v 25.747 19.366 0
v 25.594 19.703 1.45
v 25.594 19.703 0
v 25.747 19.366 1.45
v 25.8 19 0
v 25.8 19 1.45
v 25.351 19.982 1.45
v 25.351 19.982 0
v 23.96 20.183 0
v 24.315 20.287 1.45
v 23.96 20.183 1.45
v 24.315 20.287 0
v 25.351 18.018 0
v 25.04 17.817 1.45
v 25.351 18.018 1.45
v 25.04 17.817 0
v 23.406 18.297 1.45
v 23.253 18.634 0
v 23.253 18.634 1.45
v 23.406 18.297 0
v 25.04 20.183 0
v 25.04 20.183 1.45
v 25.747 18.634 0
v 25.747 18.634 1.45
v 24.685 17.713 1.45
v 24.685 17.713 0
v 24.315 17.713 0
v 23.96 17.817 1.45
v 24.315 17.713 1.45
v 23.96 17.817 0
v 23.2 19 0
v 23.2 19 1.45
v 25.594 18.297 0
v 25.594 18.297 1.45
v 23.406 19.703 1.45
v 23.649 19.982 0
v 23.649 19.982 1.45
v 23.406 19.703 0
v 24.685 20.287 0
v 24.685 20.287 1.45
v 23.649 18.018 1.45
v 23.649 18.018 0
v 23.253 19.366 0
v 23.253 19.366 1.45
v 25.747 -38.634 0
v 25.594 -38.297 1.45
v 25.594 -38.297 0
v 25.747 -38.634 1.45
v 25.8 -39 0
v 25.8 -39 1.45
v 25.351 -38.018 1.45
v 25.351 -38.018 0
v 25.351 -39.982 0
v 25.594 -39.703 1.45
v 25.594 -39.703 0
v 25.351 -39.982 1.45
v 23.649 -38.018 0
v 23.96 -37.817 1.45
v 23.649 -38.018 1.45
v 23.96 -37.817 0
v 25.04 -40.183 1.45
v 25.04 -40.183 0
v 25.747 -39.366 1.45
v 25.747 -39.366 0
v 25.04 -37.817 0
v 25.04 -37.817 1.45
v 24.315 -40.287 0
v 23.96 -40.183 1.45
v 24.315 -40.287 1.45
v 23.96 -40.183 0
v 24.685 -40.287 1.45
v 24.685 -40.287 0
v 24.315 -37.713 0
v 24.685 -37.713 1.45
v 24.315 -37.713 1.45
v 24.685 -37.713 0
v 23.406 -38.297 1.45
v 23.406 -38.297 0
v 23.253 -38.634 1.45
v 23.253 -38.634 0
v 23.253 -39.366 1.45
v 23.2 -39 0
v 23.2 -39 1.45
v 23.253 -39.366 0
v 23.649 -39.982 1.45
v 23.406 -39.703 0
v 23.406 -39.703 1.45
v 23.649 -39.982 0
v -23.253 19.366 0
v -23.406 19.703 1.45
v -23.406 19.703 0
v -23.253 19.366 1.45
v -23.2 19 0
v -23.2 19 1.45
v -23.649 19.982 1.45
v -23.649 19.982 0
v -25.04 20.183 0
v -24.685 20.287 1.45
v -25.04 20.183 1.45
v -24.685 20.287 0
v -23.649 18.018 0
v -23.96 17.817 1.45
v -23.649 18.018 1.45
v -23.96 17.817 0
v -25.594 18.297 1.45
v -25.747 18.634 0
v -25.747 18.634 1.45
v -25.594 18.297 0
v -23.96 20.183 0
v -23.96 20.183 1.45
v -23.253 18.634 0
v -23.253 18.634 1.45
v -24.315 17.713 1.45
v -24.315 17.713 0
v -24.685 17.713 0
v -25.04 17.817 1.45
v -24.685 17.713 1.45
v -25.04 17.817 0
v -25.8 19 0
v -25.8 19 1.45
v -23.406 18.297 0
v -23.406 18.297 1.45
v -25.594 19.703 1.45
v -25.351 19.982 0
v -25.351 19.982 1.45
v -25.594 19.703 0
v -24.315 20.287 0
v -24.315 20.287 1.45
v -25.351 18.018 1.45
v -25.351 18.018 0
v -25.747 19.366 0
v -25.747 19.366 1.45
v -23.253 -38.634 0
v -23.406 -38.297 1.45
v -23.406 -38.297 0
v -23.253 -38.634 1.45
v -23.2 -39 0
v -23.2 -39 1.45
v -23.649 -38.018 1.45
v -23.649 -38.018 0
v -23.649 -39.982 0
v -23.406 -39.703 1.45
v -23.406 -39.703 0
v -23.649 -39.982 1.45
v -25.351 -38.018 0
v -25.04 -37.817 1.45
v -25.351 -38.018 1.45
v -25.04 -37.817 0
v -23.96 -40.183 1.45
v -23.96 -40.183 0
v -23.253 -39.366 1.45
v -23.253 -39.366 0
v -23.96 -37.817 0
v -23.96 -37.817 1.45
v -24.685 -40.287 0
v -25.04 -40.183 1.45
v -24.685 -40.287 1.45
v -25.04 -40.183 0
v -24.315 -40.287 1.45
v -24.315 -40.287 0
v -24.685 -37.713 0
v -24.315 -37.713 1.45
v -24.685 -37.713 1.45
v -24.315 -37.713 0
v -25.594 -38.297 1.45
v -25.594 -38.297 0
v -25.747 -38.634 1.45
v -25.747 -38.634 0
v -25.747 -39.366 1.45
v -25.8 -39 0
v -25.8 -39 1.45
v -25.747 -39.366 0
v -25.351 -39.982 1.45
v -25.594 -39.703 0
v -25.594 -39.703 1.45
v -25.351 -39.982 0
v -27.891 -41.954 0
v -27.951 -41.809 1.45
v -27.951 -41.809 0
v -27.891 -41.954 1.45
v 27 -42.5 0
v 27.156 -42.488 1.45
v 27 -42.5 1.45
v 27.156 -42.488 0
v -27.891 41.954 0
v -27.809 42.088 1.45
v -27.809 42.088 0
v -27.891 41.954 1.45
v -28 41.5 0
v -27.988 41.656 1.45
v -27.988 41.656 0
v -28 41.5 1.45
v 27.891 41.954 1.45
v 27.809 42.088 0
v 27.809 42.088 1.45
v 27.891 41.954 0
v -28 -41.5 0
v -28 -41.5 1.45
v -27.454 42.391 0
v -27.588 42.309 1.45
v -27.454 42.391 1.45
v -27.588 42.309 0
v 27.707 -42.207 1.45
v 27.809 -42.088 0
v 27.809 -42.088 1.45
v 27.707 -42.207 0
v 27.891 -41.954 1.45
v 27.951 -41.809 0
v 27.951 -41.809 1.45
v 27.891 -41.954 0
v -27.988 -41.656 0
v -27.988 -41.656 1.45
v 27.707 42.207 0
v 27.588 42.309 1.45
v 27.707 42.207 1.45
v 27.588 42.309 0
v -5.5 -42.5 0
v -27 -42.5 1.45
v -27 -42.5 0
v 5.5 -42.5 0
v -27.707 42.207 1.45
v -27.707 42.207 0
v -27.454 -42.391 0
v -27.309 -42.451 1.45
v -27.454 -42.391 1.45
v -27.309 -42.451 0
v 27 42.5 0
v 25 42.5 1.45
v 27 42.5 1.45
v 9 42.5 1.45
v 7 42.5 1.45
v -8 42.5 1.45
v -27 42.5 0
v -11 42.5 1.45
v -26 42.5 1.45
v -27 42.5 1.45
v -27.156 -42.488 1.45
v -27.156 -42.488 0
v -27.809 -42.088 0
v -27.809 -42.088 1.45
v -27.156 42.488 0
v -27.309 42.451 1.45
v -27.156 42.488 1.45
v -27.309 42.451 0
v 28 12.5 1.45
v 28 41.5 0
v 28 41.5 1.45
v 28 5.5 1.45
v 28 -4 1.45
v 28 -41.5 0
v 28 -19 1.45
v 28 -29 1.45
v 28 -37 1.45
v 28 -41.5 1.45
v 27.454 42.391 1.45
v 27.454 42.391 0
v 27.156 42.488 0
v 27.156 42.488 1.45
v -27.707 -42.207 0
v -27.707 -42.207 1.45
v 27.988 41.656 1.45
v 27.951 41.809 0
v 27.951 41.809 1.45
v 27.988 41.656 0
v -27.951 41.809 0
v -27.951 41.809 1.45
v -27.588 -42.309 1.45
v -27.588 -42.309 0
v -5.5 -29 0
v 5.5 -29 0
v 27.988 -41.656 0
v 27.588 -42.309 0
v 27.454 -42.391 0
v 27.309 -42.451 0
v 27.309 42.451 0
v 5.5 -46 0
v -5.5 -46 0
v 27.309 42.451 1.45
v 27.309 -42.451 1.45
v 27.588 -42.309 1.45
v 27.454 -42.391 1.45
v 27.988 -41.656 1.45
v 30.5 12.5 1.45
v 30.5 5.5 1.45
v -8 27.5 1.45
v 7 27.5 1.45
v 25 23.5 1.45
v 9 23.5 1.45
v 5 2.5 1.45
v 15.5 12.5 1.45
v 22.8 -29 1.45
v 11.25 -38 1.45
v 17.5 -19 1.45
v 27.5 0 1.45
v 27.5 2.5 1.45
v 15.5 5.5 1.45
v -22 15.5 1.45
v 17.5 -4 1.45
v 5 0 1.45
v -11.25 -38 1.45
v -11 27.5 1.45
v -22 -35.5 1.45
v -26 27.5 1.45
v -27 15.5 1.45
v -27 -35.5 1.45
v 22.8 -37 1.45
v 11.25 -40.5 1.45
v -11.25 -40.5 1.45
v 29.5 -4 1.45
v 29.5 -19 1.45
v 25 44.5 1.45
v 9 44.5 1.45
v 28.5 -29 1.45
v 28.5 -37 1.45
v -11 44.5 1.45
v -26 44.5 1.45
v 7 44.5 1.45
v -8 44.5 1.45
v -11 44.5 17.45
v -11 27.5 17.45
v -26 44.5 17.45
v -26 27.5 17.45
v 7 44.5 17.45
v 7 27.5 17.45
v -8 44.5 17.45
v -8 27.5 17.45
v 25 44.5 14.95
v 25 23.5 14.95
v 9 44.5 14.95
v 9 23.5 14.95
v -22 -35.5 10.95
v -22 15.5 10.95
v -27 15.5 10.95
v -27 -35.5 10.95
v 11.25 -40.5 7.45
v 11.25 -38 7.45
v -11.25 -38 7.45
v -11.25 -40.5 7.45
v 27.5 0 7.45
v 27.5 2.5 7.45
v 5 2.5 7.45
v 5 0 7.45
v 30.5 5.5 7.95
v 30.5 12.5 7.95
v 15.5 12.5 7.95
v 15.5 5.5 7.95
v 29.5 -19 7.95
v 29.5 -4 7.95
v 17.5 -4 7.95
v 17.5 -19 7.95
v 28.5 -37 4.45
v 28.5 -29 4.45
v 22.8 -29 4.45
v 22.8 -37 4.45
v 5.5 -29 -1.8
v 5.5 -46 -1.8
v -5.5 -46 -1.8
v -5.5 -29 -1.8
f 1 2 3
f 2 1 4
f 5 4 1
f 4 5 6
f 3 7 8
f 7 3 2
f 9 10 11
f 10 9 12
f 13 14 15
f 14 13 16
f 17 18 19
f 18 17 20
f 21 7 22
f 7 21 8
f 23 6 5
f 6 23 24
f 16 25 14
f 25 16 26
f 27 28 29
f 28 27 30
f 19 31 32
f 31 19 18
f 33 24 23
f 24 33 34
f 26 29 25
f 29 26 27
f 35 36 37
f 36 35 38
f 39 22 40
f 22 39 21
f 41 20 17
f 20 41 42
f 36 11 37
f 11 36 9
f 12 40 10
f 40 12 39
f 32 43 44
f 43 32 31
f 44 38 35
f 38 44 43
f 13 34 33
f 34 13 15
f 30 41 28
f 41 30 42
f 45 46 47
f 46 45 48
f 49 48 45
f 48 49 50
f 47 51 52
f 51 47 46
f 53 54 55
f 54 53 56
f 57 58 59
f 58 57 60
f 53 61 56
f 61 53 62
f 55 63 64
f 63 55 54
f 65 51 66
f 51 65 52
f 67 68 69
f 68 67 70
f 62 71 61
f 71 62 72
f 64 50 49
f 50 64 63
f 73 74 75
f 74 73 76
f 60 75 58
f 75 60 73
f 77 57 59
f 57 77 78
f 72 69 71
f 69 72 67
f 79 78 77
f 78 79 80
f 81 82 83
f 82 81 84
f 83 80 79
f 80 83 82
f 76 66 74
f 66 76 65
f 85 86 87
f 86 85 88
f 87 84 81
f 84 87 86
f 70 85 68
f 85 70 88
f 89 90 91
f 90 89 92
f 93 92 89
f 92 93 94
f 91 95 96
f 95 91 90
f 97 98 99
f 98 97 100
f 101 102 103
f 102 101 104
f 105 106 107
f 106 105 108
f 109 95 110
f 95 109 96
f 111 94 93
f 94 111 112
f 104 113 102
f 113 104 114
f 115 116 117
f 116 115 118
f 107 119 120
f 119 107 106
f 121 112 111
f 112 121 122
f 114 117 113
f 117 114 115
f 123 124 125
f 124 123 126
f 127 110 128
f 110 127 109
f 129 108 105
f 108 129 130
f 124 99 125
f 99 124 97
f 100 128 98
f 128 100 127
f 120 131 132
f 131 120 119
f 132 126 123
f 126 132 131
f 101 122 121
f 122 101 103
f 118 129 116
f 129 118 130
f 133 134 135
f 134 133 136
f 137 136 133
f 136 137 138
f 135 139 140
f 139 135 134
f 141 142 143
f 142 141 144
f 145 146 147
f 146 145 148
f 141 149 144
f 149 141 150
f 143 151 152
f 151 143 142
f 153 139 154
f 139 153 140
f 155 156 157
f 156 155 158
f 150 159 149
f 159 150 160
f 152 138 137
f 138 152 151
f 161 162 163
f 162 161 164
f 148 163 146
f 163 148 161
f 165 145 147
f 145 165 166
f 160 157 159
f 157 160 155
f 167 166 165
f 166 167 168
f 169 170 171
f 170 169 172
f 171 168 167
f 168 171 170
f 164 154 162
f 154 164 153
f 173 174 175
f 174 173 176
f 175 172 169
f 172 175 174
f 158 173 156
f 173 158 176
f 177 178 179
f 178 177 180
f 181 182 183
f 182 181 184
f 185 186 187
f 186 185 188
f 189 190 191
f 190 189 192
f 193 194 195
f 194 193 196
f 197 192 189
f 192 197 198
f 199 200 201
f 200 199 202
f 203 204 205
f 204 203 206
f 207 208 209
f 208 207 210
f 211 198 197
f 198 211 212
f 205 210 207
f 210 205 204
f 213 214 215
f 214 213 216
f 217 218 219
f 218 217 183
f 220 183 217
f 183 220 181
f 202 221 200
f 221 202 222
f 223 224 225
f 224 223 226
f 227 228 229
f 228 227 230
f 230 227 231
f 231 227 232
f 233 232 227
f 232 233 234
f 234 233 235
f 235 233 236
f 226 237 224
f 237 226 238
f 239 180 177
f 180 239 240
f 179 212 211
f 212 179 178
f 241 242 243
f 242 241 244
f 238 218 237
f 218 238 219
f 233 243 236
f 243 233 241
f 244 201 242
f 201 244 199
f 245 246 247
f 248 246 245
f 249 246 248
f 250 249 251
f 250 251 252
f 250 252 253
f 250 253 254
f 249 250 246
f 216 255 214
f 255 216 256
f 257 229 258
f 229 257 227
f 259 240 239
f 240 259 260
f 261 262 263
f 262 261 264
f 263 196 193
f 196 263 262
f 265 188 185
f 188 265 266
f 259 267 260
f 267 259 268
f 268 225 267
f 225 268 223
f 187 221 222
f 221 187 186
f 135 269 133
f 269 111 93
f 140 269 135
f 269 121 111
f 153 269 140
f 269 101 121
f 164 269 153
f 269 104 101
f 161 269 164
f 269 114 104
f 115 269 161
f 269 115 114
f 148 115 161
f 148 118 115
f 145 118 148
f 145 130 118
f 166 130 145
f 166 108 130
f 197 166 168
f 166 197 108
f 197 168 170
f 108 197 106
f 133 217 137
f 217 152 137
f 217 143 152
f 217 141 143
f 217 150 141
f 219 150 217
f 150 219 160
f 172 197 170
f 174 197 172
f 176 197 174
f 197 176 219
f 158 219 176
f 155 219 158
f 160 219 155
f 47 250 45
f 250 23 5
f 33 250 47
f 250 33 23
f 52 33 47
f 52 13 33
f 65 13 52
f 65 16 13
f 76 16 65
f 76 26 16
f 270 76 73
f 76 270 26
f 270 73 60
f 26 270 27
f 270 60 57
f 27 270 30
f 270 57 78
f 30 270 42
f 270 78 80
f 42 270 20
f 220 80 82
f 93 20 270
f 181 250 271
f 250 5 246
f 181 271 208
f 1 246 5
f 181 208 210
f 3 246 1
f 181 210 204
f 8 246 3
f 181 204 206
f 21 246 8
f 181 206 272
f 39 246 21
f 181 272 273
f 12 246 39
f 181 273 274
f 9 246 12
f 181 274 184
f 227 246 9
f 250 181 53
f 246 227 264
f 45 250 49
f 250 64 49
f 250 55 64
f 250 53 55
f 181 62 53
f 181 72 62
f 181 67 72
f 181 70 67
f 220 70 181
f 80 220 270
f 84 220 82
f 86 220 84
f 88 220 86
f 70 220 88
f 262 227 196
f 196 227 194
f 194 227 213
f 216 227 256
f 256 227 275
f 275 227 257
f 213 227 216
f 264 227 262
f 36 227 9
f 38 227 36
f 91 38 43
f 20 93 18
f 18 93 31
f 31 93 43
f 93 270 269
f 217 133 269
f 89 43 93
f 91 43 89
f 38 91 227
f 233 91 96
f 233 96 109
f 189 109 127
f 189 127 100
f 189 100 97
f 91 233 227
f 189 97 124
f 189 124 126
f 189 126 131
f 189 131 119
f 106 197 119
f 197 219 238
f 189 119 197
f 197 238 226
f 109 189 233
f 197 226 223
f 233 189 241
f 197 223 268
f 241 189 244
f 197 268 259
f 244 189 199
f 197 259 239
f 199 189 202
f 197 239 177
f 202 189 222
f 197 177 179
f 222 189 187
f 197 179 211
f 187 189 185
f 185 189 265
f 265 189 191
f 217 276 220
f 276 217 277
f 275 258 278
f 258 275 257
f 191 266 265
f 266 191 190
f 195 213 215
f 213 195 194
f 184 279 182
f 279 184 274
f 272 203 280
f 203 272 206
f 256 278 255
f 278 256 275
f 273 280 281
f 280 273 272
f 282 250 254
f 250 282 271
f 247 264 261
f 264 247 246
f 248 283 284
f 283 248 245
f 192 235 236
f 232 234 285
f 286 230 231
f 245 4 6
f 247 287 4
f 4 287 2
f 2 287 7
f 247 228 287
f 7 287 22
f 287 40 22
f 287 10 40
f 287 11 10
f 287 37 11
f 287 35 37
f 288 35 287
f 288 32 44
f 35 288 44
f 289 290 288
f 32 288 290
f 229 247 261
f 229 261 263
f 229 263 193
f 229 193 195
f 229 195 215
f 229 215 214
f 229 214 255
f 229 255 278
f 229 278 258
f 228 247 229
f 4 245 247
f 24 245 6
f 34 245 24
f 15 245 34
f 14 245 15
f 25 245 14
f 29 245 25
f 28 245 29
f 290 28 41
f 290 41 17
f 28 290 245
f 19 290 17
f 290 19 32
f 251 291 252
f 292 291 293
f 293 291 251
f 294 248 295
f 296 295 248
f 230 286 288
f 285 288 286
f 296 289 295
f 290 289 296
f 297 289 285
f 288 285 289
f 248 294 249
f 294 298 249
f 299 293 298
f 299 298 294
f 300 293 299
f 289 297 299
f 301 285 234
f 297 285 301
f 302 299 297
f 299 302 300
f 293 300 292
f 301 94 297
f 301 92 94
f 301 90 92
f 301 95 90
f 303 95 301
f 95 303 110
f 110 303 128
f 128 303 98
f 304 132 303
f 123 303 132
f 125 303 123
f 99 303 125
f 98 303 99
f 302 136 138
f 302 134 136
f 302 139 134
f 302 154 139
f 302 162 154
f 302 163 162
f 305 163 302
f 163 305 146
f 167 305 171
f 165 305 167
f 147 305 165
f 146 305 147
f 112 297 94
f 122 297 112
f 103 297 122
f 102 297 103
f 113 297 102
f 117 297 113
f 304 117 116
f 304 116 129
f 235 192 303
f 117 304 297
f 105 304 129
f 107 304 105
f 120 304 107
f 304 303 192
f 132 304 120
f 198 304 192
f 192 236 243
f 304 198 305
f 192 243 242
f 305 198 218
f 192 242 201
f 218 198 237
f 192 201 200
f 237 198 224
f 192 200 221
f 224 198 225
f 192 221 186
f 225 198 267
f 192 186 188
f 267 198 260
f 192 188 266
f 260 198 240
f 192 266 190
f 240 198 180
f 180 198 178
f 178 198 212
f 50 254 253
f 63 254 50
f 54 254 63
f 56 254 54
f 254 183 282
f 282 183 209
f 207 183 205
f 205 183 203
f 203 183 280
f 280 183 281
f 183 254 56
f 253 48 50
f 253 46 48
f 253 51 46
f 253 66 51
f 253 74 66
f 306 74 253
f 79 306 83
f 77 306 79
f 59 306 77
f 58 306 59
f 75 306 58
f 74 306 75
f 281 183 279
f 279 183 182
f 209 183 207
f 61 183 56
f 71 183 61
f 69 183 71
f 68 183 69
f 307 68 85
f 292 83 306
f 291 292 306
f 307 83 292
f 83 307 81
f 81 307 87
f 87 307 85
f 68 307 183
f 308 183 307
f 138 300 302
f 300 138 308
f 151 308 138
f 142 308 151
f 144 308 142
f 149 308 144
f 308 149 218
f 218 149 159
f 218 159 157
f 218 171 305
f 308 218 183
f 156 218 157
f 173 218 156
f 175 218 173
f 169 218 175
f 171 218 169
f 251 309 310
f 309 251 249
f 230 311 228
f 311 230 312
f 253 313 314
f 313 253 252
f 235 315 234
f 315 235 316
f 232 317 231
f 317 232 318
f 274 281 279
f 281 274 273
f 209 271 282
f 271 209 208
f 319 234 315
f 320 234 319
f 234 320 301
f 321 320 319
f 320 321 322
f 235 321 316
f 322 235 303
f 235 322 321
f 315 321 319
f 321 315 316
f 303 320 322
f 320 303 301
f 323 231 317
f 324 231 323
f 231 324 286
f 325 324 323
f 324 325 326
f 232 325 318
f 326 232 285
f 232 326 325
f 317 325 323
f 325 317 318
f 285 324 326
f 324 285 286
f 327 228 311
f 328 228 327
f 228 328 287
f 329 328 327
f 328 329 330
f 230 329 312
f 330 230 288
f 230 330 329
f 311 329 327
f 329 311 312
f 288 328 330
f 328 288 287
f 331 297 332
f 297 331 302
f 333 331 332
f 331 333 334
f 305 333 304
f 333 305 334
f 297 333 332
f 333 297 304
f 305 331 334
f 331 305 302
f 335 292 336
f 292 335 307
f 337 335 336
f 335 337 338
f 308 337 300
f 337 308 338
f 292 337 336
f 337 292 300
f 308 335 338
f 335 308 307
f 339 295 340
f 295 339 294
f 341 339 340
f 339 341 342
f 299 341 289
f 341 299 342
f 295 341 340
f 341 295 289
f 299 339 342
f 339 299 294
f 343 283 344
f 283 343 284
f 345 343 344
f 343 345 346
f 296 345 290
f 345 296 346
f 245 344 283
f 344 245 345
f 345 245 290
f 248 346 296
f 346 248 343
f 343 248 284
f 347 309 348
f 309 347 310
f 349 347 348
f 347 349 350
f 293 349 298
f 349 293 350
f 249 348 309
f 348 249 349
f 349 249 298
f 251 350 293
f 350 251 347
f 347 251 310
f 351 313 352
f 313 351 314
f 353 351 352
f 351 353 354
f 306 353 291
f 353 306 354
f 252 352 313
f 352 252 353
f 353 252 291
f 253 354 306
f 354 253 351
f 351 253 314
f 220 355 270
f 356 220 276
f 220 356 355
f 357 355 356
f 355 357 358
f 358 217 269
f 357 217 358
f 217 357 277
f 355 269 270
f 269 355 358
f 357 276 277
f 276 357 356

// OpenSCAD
// pi3
// this does not show all the components
// leave 2mm below and 3mm above the pcb


//-----------------
module pi3(){

// baseplate
difference(){
    linear_extrude(height=1.45)
    offset(r=1,$fn=40)
    square([56-2,85-2],center=true);

    translate([0,-10,0]){
        translate([24.5,29,-1])
        cylinder(r=2.6/2,h=3,$fn=22);
        translate([24.5,-29,-1])
        cylinder(r=2.6/2,h=3,$fn=22);
        translate([-24.5,29,-1])
        cylinder(r=2.6/2,h=3,$fn=22);
        translate([-24.5,-29,-1])
        cylinder(r=2.6/2,h=3,$fn=22);
    }
}

// usb 1
translate([-28+2,42.5-15,1.45])
cube([15,17,16]);

// usb 2
translate([-28+2+18,42.5-15,1.45])
cube([15,17,16]);

// ethernet
translate([-28+2+35,42.5-19,1.45])
cube([16,21,13.5]);

// gpio
translate([-28+1,-35.5,1.45])
cube([5,51,9.5]);

// display
translate([-22.5/2,-42.5+2,1.45])
cube([22.5,2.5,6]);

// camera
color("red")
translate([28-22.5-0.5,0,1.45])
cube([22.5,2.5,6]);

// audio
translate([28-12-0.5,5.5,1.45])
cube([15,7,6.5]);

// hdmi
translate([28-10-0.5,-19,1.45])
cube([12,15,6.5]);

// usb power in
translate([28-4.7-0.5,-37,1.45])
cube([5.7,8,3]);

// sd card
color("orange")
translate([-11/2,-42.5-3.5,-1.8])
cube([11,17,1.8]);


}//==================================

pi3();
